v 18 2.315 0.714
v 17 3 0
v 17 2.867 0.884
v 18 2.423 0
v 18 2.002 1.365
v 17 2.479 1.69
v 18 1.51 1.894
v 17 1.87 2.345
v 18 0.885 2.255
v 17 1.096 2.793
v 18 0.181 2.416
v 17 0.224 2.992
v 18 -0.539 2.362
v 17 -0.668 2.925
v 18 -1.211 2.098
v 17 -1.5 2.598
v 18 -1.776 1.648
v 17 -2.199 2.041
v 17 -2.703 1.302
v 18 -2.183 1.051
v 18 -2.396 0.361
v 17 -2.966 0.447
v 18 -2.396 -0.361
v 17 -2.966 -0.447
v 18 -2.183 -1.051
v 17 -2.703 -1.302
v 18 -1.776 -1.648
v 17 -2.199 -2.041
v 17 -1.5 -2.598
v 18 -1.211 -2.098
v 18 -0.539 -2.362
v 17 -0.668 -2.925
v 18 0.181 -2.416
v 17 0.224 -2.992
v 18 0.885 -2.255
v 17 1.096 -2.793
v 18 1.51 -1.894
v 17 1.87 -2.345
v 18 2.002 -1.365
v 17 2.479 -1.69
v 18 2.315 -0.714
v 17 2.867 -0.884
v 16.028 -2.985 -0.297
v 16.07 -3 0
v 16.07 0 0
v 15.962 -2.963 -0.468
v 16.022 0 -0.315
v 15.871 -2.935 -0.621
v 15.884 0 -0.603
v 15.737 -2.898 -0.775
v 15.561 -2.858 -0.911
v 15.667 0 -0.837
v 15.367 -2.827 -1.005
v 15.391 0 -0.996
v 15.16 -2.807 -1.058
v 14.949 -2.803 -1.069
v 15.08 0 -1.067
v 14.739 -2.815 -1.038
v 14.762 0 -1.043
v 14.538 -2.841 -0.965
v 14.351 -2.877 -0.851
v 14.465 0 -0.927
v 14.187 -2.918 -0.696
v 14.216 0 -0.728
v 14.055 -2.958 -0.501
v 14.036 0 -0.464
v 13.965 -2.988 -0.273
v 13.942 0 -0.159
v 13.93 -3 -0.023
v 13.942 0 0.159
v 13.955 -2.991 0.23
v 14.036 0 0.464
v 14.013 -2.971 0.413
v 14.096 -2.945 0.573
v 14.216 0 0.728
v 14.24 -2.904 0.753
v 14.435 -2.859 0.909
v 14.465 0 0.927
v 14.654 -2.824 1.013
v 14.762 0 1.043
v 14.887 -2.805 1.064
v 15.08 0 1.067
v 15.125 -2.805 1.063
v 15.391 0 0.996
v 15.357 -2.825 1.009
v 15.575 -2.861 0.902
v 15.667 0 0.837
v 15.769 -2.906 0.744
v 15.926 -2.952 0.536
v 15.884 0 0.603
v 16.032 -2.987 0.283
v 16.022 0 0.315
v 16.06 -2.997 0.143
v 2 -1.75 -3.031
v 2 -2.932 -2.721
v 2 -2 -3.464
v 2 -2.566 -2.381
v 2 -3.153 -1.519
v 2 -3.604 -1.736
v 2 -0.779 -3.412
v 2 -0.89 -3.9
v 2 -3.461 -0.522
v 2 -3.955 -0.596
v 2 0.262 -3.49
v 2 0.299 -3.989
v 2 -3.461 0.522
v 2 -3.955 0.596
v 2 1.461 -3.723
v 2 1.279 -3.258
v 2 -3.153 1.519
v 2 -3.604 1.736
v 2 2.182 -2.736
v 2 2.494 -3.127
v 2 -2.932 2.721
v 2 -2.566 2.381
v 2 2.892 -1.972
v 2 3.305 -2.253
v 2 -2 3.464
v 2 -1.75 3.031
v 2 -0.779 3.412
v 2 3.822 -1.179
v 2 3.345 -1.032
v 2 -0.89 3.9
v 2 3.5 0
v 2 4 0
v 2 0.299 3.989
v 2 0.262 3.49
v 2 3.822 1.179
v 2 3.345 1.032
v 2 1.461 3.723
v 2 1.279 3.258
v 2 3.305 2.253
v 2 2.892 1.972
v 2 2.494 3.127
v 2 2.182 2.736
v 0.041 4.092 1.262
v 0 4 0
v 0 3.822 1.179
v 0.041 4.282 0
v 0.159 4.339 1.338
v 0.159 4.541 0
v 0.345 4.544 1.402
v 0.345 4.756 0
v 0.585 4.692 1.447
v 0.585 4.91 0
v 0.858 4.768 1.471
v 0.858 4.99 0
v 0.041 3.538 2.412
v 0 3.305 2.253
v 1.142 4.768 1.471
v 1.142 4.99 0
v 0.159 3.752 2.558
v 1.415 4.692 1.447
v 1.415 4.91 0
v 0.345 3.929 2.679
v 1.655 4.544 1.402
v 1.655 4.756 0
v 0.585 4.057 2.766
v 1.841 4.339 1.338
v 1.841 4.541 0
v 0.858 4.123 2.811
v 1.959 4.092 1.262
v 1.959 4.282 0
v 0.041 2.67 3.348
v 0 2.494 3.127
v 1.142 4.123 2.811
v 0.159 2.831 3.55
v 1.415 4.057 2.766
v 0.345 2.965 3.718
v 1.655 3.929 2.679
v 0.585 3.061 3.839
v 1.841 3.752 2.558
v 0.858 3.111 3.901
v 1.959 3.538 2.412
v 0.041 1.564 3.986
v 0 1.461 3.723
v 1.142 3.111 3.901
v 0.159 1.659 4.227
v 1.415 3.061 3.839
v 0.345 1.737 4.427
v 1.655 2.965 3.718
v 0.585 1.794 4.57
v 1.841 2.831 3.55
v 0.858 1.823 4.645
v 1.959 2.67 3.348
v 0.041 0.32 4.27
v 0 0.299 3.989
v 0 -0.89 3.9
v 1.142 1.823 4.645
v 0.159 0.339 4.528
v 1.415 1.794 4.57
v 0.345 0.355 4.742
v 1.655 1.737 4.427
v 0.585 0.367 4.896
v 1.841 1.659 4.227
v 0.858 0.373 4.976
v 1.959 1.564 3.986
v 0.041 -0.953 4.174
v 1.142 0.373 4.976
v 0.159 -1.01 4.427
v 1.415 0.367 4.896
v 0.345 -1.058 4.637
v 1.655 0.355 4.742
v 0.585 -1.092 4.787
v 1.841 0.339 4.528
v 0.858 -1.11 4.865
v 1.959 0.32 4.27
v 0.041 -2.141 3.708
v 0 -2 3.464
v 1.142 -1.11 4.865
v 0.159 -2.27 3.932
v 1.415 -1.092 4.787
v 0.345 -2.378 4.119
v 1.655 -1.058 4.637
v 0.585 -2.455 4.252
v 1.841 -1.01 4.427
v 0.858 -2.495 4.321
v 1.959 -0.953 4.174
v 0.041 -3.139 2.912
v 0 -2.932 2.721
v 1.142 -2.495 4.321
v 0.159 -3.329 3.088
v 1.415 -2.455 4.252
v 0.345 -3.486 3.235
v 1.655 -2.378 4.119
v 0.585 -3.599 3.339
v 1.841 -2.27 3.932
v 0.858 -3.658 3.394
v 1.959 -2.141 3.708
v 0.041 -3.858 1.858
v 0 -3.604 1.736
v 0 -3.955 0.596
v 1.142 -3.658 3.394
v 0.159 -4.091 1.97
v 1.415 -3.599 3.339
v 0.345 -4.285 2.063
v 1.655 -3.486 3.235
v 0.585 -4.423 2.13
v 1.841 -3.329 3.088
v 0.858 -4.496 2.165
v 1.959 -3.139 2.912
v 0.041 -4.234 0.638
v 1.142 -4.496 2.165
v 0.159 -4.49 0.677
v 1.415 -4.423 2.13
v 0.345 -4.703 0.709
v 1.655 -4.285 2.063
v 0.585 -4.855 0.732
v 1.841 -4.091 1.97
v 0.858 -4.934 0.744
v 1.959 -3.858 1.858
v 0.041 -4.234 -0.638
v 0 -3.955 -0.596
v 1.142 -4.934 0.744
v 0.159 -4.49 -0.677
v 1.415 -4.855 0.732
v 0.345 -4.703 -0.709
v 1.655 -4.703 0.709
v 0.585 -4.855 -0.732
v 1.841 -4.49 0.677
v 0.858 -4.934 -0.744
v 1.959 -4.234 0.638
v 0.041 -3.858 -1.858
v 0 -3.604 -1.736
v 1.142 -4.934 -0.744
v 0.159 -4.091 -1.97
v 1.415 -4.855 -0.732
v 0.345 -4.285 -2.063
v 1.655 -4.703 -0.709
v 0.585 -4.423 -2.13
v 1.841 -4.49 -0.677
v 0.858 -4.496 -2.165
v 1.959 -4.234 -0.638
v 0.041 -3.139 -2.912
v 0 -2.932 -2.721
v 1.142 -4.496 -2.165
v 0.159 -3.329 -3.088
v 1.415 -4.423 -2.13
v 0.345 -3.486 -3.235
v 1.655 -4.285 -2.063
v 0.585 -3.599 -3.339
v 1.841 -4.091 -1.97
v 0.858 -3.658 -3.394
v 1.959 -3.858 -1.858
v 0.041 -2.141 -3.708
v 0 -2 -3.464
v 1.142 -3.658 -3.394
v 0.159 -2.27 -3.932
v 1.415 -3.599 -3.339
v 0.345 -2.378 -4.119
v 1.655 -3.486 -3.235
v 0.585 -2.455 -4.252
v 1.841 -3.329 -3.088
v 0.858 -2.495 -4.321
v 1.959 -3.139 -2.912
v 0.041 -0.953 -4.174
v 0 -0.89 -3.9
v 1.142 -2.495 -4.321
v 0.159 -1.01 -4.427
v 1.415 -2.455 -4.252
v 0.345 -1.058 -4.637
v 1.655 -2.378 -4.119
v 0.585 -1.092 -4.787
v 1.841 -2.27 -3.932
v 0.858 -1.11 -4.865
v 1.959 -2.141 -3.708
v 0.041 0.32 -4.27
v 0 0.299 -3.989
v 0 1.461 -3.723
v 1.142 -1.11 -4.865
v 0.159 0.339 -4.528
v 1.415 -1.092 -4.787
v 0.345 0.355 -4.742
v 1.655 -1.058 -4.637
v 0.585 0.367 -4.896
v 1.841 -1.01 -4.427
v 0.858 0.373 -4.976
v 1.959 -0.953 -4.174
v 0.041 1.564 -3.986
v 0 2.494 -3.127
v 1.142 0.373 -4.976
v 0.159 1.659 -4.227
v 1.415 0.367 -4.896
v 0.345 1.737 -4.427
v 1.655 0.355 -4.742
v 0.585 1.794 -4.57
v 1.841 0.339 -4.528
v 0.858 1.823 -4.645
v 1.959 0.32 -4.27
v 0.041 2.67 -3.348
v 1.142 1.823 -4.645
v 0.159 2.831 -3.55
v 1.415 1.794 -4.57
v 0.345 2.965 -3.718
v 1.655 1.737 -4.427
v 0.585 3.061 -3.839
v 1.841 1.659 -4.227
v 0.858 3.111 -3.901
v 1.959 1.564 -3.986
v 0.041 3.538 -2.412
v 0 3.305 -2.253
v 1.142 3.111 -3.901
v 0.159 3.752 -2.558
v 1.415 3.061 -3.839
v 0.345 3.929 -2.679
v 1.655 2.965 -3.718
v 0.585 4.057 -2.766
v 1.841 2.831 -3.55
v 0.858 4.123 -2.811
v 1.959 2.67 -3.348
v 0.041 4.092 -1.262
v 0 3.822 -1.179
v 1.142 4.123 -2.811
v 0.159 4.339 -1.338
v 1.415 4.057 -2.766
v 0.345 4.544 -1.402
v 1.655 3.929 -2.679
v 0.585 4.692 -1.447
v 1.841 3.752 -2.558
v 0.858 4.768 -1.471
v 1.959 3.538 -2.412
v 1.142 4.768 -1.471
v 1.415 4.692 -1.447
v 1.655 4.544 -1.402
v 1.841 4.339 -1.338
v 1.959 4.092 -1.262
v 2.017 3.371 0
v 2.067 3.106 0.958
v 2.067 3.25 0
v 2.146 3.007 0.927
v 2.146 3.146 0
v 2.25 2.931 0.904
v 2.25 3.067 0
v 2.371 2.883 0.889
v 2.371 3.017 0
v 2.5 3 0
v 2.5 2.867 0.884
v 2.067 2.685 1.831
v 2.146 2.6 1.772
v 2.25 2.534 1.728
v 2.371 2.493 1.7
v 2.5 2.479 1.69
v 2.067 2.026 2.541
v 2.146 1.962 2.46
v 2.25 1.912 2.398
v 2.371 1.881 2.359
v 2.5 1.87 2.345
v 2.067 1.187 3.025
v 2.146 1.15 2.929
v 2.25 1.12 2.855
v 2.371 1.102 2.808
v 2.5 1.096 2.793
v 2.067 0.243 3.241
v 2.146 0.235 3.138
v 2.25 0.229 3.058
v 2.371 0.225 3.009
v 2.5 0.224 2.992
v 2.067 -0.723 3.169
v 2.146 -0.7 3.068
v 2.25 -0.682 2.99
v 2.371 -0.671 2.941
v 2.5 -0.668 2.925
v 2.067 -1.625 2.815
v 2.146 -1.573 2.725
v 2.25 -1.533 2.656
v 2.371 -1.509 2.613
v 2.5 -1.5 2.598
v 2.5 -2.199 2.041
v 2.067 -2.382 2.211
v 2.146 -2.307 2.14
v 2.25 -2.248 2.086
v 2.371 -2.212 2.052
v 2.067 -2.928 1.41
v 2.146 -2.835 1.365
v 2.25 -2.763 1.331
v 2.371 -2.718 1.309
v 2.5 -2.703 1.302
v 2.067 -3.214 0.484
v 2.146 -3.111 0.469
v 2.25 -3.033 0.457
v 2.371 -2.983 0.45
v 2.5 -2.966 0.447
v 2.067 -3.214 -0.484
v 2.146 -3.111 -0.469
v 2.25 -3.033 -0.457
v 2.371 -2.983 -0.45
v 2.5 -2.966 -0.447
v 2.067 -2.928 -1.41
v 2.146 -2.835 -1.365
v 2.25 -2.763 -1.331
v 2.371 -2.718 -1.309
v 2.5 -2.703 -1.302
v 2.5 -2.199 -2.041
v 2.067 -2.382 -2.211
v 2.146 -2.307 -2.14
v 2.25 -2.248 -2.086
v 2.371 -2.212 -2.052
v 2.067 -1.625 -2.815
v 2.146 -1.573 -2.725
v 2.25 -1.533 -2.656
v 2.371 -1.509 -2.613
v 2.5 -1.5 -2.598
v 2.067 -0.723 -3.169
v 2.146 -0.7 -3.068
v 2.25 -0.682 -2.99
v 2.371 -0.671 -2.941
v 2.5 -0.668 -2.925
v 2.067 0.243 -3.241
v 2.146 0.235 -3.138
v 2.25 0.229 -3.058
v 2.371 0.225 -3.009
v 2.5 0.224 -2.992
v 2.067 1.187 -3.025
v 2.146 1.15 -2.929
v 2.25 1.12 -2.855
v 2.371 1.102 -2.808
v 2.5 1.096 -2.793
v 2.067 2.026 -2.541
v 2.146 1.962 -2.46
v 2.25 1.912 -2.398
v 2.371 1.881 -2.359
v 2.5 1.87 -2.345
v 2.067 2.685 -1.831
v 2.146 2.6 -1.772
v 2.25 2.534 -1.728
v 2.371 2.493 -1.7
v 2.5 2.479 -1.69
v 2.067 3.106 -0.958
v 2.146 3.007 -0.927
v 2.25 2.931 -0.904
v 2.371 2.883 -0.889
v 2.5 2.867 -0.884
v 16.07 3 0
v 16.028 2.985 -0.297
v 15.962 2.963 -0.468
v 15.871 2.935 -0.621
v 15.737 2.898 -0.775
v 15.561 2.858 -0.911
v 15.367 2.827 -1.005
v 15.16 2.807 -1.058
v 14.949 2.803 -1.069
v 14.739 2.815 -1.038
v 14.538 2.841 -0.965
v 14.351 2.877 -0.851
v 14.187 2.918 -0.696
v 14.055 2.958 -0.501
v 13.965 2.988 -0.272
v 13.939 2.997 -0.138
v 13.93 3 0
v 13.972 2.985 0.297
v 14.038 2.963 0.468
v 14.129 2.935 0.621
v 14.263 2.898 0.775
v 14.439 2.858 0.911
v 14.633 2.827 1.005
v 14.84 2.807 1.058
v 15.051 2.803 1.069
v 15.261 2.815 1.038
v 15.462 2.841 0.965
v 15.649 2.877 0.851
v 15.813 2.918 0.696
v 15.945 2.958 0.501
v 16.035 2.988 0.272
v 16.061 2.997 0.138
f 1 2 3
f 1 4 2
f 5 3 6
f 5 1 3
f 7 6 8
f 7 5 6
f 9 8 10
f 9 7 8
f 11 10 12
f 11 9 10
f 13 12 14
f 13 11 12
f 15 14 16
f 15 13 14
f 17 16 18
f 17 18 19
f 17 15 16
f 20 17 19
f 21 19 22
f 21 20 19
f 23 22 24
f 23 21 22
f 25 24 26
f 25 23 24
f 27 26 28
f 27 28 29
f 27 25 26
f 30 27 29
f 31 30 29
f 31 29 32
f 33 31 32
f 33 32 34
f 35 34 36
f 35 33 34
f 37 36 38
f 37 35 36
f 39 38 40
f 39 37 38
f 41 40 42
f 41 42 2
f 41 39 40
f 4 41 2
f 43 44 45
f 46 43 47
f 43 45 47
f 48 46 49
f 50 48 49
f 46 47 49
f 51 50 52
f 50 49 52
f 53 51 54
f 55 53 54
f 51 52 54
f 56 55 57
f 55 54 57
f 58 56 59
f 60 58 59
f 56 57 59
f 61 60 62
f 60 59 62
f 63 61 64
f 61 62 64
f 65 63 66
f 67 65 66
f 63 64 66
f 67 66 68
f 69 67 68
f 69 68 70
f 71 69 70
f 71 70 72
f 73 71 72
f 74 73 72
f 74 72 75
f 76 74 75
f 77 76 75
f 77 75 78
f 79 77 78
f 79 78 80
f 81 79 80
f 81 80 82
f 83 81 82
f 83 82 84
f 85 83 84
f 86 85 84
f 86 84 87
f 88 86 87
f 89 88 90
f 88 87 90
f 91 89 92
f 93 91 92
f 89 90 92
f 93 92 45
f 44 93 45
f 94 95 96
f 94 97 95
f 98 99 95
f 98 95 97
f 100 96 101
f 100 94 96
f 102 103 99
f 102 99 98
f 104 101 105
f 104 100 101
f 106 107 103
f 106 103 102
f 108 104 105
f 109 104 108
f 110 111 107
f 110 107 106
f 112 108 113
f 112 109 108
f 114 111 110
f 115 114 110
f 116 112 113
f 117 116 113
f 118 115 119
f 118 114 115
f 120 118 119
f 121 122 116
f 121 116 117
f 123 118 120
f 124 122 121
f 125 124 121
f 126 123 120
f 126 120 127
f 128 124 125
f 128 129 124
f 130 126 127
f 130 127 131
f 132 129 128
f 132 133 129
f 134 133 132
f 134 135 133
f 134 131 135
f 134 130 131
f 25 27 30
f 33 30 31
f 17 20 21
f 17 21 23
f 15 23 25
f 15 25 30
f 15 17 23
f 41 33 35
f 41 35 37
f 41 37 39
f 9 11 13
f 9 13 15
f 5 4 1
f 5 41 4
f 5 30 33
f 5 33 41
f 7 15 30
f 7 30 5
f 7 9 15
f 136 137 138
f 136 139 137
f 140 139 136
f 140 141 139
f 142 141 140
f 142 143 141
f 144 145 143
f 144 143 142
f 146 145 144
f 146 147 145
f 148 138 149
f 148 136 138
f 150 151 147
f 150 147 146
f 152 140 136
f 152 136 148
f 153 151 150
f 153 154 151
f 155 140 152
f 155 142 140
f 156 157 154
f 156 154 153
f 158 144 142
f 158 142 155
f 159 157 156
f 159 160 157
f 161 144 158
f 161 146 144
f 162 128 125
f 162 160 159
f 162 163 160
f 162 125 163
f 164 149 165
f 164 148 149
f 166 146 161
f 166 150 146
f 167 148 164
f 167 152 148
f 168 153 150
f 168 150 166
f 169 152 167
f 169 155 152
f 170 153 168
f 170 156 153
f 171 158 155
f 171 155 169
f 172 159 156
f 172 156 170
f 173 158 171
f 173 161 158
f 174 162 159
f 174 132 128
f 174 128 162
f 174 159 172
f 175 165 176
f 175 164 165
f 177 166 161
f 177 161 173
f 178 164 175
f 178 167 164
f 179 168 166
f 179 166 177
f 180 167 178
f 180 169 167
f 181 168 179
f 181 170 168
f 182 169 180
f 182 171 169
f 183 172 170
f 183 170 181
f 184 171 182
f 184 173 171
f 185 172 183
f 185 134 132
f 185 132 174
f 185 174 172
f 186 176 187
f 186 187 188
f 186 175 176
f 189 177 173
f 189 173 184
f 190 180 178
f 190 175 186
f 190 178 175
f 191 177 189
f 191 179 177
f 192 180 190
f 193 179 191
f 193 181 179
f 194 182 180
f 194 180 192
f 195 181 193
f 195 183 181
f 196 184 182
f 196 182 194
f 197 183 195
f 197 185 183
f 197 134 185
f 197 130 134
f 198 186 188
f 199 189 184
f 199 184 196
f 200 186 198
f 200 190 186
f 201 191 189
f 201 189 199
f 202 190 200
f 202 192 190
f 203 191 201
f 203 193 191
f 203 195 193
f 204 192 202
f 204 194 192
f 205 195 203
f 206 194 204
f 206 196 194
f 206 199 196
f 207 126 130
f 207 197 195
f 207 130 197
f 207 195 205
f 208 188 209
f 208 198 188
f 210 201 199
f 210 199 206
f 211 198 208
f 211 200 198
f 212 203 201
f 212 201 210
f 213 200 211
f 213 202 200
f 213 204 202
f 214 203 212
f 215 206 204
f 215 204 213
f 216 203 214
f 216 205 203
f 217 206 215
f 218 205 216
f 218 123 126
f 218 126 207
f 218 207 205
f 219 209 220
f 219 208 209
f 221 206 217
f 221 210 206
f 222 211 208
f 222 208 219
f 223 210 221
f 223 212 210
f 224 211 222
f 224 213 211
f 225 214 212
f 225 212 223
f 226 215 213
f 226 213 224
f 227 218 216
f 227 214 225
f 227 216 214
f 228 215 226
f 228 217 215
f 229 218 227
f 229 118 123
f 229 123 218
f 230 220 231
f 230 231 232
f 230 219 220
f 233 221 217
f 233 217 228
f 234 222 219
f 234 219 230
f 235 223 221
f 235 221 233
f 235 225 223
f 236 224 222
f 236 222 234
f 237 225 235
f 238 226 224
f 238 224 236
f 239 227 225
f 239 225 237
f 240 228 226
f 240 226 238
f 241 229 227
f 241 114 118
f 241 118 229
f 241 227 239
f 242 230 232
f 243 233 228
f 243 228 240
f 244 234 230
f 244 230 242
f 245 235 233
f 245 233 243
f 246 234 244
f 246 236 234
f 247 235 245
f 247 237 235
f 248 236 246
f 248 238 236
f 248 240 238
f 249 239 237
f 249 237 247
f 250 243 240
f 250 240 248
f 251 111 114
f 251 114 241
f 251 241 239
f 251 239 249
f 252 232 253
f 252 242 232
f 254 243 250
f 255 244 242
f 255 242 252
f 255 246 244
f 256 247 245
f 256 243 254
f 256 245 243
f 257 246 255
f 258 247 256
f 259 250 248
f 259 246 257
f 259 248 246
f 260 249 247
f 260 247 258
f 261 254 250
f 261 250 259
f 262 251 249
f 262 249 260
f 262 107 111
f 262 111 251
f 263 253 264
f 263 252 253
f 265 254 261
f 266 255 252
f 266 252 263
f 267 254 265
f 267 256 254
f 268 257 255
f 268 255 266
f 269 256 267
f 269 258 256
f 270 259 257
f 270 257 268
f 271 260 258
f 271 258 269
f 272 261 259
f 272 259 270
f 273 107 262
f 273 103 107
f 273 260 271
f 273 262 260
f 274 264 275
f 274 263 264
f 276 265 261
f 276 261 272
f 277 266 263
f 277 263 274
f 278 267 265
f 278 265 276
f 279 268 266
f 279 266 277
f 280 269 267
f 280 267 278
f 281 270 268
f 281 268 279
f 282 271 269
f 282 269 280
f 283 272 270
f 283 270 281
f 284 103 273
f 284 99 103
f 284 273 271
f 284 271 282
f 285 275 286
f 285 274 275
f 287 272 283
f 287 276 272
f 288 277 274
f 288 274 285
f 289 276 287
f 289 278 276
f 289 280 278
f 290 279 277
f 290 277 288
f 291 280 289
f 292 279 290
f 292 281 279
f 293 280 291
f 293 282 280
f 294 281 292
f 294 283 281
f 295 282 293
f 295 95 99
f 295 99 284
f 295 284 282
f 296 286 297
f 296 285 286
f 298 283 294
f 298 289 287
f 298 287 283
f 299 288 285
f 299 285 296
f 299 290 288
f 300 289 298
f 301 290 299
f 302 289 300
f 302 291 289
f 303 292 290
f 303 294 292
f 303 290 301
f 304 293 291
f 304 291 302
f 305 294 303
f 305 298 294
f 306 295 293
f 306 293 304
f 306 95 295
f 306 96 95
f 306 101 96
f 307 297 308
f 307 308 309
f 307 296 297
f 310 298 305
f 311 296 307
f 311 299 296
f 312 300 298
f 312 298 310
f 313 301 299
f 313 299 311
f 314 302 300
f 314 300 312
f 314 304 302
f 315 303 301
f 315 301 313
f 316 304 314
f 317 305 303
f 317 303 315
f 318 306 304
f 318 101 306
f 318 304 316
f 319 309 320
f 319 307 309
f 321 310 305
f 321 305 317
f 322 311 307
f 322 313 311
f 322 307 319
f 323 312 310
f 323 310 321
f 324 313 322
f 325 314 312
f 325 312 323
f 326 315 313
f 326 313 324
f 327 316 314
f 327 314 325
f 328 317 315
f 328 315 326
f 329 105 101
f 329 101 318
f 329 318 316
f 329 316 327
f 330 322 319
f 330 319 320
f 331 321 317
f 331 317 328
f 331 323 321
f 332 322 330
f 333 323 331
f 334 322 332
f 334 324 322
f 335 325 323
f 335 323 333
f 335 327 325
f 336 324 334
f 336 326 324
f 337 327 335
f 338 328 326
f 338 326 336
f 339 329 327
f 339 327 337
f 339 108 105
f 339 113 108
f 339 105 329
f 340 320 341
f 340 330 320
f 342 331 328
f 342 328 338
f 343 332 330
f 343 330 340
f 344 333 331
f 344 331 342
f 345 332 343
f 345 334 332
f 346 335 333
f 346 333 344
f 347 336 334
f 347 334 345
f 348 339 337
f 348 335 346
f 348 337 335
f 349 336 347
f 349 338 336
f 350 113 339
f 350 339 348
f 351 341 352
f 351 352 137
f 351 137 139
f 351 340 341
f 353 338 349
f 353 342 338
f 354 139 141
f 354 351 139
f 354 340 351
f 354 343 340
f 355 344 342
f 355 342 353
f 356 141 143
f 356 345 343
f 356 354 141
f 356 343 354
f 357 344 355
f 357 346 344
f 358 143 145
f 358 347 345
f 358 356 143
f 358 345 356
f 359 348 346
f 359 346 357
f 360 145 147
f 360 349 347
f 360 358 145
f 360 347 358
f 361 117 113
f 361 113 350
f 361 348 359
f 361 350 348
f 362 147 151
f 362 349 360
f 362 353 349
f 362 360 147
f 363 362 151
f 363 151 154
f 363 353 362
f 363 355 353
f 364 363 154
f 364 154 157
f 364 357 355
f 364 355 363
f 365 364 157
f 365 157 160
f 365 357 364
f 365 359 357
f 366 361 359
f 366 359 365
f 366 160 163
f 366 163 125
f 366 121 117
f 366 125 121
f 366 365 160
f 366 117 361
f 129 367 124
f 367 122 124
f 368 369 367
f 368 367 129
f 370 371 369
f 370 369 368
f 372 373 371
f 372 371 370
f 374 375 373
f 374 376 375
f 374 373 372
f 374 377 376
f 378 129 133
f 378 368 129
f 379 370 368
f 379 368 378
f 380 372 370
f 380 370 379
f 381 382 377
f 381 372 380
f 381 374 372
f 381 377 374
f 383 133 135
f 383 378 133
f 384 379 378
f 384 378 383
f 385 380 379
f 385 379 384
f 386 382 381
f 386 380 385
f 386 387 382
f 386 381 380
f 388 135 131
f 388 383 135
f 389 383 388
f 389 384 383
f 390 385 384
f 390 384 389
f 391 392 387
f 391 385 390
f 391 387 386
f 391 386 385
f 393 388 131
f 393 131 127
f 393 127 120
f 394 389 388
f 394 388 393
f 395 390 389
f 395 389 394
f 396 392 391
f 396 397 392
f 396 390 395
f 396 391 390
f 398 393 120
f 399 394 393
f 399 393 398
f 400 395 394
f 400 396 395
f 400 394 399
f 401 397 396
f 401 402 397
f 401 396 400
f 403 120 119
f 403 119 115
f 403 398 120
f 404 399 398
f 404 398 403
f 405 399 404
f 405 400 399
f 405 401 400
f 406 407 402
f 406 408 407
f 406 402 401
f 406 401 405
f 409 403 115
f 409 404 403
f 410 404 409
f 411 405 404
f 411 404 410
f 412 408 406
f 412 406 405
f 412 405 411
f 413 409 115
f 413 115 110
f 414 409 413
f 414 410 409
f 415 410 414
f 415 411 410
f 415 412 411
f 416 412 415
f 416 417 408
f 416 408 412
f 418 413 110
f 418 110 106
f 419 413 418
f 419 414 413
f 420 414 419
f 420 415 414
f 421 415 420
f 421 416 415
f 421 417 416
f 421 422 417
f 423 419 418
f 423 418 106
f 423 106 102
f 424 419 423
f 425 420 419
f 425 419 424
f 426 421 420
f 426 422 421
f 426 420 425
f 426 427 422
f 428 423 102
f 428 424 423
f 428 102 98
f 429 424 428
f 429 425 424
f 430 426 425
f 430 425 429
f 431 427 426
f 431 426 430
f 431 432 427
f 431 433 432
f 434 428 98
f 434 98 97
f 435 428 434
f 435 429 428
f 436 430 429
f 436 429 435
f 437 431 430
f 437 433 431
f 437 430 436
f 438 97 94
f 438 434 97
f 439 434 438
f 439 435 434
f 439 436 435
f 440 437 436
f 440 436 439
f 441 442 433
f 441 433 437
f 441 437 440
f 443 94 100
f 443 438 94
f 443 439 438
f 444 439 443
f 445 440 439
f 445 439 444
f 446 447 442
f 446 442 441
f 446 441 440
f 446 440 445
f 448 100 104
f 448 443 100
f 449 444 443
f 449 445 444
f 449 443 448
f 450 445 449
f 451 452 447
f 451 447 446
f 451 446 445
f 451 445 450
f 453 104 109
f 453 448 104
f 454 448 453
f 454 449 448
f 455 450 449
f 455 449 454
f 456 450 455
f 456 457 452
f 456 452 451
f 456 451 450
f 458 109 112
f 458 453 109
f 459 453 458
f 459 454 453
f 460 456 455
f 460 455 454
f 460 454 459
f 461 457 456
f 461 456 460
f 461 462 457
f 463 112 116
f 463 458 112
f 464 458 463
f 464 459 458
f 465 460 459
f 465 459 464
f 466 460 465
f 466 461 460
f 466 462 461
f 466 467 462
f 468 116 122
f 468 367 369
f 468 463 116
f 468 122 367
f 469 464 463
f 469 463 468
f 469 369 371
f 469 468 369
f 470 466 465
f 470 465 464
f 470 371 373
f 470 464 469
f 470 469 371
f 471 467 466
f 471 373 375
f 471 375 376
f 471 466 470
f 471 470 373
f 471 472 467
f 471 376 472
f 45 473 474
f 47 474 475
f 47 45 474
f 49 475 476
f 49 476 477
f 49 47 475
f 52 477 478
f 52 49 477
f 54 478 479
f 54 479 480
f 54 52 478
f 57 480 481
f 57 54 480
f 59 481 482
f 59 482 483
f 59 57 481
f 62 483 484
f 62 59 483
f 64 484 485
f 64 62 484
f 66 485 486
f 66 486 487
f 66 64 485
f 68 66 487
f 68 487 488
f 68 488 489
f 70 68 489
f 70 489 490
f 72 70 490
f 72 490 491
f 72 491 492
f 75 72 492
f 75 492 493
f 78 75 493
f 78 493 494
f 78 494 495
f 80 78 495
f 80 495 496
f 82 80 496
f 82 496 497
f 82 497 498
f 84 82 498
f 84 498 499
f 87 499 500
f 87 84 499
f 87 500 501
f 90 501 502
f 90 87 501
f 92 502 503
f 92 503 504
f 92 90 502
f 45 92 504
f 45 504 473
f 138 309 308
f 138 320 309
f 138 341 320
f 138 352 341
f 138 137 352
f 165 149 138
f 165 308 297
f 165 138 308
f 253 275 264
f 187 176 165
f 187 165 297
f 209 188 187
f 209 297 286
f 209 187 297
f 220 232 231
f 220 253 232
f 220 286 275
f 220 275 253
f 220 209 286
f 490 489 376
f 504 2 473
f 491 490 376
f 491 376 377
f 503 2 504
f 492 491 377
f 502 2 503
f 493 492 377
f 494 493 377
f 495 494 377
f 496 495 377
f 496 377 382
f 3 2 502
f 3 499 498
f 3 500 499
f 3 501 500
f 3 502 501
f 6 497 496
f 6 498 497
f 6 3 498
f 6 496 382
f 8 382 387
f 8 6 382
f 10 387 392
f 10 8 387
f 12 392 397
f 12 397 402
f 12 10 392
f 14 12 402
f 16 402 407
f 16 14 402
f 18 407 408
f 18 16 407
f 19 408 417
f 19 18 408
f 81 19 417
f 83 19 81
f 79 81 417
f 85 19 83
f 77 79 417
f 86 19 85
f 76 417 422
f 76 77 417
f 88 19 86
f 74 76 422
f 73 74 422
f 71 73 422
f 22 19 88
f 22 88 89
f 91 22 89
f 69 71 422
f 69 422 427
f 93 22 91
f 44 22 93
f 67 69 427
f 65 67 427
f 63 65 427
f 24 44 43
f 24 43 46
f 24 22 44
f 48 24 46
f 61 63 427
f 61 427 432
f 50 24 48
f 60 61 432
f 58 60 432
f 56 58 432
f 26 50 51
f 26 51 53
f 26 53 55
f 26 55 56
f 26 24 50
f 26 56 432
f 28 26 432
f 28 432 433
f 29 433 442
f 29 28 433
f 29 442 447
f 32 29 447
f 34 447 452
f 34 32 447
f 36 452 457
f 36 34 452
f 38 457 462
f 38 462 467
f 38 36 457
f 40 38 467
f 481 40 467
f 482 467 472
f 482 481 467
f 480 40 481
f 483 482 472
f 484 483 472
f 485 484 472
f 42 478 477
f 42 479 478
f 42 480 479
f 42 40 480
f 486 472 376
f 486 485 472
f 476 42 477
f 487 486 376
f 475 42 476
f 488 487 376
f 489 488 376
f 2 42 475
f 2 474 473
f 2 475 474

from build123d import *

# Parameters (mm, degrees)
CHAMFER1_R      = 0.5
SKETCH2_R       = 1.07
HOLE_DEPTH      = 6
HOLE_DEPTH_BACK = 6.0000001


with BuildPart() as part:
    # Sketch1 → BaseBody (revolve)
    with BuildSketch(Plane.XY):
        with BuildLine():
            Line((18, 0), (0, 0))
            Line((0, 0), (0, 4))
            ThreePointArc((0, 4), (1, 5), (2, 4))
            Line((2, 4), (2, 3))
            Line((2, 3), (17, 3))
            Line((17, 3), (18, 2.422649731))
            Line((18, 2.422649731), (18, 0))
        make_face()
    revolve(axis=Axis((-19.830028721, 0, 0), (1, 0, 0)))

    # Chamfer1
    chamfer1_edges = [part.edges().sort_by_distance(p)[0] for p in [
        (2, -3, 0),
    ]]
    fillet(chamfer1_edges, radius=CHAMFER1_R)

    # Sketch2 → Hole (cut, two sides)
    with BuildSketch(Plane(origin=(0, 0, 0), x_dir=(1, 0, 0), z_dir=(0, 1, 0))) as hole_sk:
        with Locations((15, 0)):
            Circle(SKETCH2_R)
    extrude(amount=HOLE_DEPTH, mode=Mode.SUBTRACT)
    extrude(hole_sk.sketch, amount=-HOLE_DEPTH_BACK, mode=Mode.SUBTRACT)


solid = part.part
